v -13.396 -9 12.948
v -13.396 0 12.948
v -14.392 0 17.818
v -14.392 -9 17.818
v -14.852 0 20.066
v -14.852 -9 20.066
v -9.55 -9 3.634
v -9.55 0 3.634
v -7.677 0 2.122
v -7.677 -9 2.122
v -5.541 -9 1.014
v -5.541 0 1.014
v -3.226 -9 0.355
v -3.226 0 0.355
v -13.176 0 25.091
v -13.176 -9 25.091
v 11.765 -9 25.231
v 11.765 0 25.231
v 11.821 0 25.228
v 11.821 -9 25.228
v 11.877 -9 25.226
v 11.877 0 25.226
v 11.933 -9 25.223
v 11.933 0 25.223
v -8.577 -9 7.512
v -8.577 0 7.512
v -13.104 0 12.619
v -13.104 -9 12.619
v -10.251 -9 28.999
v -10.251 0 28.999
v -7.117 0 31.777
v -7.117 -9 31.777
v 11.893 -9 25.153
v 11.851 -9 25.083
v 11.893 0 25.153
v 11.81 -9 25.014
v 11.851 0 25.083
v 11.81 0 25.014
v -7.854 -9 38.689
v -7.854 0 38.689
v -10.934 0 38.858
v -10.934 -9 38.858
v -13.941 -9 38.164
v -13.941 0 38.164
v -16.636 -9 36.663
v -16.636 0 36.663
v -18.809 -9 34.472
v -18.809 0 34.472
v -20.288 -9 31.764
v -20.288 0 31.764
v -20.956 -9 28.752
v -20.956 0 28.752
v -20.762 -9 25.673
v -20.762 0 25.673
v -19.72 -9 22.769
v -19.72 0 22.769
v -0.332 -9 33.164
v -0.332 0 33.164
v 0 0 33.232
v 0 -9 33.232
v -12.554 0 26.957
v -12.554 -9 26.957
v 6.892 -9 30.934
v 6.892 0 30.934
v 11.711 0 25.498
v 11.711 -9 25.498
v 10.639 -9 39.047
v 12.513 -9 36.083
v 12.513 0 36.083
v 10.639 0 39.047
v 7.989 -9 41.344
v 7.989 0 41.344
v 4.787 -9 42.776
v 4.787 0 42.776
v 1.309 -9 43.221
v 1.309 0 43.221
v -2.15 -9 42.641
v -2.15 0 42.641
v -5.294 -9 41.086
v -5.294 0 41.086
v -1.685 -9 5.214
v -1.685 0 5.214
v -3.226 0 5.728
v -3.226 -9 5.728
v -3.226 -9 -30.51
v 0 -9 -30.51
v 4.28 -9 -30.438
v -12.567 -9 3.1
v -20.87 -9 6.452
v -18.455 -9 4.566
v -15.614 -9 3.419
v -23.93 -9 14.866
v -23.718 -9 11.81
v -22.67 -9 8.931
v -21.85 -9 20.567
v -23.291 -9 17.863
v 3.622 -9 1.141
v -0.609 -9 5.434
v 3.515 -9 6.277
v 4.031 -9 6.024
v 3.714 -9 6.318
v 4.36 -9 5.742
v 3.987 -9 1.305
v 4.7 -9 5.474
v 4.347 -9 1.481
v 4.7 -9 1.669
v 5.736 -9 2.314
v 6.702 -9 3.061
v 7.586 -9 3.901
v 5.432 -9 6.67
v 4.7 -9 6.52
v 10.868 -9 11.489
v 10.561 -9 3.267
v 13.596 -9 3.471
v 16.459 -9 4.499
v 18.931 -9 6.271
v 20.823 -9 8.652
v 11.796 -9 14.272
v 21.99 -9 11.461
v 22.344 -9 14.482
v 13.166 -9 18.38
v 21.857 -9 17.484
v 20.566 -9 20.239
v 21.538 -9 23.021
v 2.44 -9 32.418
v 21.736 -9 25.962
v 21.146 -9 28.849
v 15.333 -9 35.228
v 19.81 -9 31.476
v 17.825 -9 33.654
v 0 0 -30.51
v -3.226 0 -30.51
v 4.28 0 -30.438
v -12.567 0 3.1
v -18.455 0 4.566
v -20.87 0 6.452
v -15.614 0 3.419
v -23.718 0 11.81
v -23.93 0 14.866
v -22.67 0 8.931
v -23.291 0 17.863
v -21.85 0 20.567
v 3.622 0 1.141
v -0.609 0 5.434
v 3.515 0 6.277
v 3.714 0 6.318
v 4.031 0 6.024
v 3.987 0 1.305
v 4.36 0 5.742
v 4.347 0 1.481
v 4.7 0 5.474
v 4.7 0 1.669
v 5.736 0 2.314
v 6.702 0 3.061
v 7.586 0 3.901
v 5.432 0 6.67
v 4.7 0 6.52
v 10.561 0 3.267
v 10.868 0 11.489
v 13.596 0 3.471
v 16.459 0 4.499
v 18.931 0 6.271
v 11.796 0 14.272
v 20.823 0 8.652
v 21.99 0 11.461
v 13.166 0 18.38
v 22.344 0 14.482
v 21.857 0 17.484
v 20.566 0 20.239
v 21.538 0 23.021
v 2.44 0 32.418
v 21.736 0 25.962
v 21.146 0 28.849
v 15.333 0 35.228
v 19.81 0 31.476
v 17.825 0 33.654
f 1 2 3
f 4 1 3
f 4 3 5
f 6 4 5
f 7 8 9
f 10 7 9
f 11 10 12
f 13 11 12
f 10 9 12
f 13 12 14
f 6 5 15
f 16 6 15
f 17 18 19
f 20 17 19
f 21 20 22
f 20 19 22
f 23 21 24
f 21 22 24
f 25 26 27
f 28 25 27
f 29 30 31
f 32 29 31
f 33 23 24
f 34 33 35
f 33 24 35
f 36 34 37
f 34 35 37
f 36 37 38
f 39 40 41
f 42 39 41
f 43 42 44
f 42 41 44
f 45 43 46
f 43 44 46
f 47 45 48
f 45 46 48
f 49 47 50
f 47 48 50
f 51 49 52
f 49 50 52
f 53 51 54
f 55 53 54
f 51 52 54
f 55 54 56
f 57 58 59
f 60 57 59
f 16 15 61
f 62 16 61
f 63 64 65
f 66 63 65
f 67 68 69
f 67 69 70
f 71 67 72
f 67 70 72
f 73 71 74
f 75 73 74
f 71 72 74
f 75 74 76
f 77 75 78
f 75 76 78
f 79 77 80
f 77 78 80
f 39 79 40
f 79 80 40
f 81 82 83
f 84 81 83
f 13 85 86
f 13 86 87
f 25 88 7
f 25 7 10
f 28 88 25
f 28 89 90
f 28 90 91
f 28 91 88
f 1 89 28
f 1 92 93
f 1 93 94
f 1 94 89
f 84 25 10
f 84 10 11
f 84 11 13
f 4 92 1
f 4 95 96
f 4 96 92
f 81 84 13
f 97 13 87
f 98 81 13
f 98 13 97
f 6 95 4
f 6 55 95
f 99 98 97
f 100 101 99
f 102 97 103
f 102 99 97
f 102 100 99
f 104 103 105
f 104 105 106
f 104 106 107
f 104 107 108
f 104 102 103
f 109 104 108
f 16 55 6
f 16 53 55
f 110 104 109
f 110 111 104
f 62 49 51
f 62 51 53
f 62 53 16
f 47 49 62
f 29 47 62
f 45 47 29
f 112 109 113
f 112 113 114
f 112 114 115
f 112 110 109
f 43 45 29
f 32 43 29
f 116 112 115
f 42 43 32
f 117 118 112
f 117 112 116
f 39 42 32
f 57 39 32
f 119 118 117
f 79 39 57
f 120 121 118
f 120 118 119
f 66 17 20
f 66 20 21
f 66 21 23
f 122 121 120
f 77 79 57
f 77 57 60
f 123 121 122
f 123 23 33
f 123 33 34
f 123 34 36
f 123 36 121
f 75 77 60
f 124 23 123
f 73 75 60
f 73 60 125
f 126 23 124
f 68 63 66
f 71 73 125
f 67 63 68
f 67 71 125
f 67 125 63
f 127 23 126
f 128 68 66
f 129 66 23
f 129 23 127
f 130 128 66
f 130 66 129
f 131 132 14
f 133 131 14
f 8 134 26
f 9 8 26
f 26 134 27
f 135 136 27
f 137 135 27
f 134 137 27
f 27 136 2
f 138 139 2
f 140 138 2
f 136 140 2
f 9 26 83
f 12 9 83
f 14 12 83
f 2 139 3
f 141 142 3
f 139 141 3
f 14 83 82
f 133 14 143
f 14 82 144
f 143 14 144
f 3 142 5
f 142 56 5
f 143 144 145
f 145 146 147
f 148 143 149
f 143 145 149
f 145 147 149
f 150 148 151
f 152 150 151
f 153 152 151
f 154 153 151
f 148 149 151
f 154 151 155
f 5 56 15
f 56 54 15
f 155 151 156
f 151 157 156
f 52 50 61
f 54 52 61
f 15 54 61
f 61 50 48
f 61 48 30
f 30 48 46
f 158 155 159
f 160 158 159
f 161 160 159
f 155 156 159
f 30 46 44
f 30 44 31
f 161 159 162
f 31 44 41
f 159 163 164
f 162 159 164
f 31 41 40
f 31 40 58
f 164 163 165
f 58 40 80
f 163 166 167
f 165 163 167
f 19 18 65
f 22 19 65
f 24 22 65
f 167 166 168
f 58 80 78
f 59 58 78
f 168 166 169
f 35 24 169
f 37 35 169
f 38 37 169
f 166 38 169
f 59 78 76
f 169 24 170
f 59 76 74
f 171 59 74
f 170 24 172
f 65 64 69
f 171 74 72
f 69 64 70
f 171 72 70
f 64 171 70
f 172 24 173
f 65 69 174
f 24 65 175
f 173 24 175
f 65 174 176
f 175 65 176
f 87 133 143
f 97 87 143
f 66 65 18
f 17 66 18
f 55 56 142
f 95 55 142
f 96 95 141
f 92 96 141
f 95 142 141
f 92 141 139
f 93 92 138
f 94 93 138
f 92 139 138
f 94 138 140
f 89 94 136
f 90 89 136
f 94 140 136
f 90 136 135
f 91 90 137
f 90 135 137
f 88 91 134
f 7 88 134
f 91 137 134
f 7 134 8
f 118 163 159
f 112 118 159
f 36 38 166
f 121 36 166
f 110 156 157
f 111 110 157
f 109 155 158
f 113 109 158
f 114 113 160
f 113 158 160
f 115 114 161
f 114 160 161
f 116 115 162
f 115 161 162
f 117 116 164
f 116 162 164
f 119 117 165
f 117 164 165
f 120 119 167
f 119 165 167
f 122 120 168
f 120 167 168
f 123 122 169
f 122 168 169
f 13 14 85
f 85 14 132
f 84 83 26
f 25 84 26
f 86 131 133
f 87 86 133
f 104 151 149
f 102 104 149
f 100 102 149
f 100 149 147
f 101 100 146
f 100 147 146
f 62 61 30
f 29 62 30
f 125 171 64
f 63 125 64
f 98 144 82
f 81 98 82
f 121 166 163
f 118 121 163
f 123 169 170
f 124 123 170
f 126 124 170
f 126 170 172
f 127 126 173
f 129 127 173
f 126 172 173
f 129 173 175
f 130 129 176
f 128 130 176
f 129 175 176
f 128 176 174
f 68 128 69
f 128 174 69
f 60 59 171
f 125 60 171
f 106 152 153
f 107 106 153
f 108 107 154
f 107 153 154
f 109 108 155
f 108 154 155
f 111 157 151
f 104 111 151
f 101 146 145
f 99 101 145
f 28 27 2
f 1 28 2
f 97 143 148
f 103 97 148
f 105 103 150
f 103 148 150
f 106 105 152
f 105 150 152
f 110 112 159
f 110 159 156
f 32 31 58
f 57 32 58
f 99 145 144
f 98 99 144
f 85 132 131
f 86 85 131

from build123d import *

# Parameters (mm, degrees)
F1_DEPTH = 9


with BuildPart() as f1:
    # F0 (on Front) → F1 (new body)
    with BuildSketch(Plane.XZ):
        with BuildLine():
            ThreePointArc((-19.7199515168, 22.7688088414), (-16.6360107994, 24.4598997459), (-13.1759548296, 25.0911615632))
            Line((-13.1759548296, 25.0911615632), (-12.553585429, 26.9574491451))
            Line((-12.553585429, 26.9574491451), (-10.2510419619, 28.9986901835))
            ThreePointArc((-10.2510419619, 28.9986901835), (-10.1077855778, 34.1050974839), (-7.8535185141, 38.6892220367))
            ThreePointArc((-7.8535185141, 38.6892220367), (-18.8089000647, 34.4723344318), (-19.7199515168, 22.7688088414))
        make_face()
        with BuildLine():
            Line((-14.8518085926, 20.0658099574), (-13.1759548296, 25.0911615632))
            ThreePointArc((-13.1759548296, 25.0911615632), (-16.6360107994, 24.4598997459), (-19.7199515168, 22.7688088414))
            ThreePointArc((-19.7199515168, 22.7688088414), (-17.4770465825, 19.8404198684), (-14.3921665295, 17.8181440266))
            Line((-14.3921665295, 17.8181440266), (-14.8518085926, 20.0658099574))
        make_face()
        with BuildLine():
            Line((-13.3963086419, 12.9483637654), (-14.3921665295, 17.8181440266))
            ThreePointArc((-14.3921665295, 17.8181440266), (-17.4770465825, 19.8404198684), (-19.7199515168, 22.7688088414))
            ThreePointArc((-19.7199515168, 22.7688088414), (-22.6703383342, 8.9306933135), (-9.5498657155, 3.6343339981))
            ThreePointArc((-9.5498657155, 3.6343339981), (-12.2712093358, 7.7530477474), (-13.1041599616, 12.6188166798))
            Line((-13.1041599616, 12.6188166798), (-13.3963086419, 12.9483637654))
        make_face()
        with BuildLine():
            Line((-3.2264382129, 0.3550507135), (-3.2264382129, 5.7278911556))
            Line((-3.2264382129, 5.7278911556), (-5.1312660195, 6.3631129466))
            ThreePointArc((-5.1312660195, 6.3631129466), (-7.1772197402, 4.7342237961), (-9.5498657155, 3.6343339981))
            ThreePointArc((-9.5498657155, 3.6343339981), (-6.6370818502, 1.5146819538), (-3.2264382129, 0.3550507135))
        make_face()
        with BuildLine():
            Line((-1.6854464257, 5.2140013649), (-3.2264382129, 5.7278911556))
            Line((-3.2264382129, 5.7278911556), (-3.2264382129, 0.3550507135))
            ThreePointArc((-3.2264382129, 0.3550507135), (0.2553267791, 0.2456421269), (3.6218142124, 1.140862803))
            Line((3.6218142124, 1.140862803), (3.5146783317, 6.277413876))
            Line((3.5146783317, 6.277413876), (-0.6090724081, 5.4341171602))
            Line((-0.6090724081, 5.4341171602), (-1.6854464257, 5.2140013649))
        make_face()
        with BuildLine():
            ThreePointArc((-9.5498657155, 3.6343339981), (-7.1772197402, 4.7342237961), (-5.1312660195, 6.3631129466))
            Line((-5.1312660195, 6.3631129466), (-8.5770856134, 7.5122245284))
            Line((-8.5770856134, 7.5122245284), (-13.1041599616, 12.6188166798))
            ThreePointArc((-13.1041599616, 12.6188166798), (-12.2712093358, 7.7530477474), (-9.5498657155, 3.6343339981))
        make_face()
        with BuildLine():
            ThreePointArc((3.6218142124, 1.140862803), (0.2553267791, 0.2456421269), (-3.2264382129, 0.3550507135))
            Line((-3.2264382129, 0.3550507135), (-3.2264382129, -30.5104665458))
            Line((-3.2264382129, -30.5104665458), (0, -30.5104665458))
            Line((0, -30.5104665458), (4.2804706275, -30.4379349907))
            Line((4.2804706275, -30.4379349907), (3.6218142124, 1.140862803))
        make_face()
        with BuildLine():
            ThreePointArc((-7.8535185141, 38.6892220367), (-10.1077855778, 34.1050974839), (-10.2510419619, 28.9986901835))
            Line((-10.2510419619, 28.9986901835), (-7.117446192, 31.7766721736))
            Line((-7.117446192, 31.7766721736), (-0.3315885654, 33.1643630917))
            ThreePointArc((-0.3315885654, 33.1643630917), (-3.477568869, 36.7640757707), (-7.8535185141, 38.6892220367))
        make_face()
        with BuildLine():
            ThreePointArc((12.5130116372, 36.0825908768), (3.0643977065, 43.1259953977), (-7.8535185141, 38.6892220367))
            ThreePointArc((-7.8535185141, 38.6892220367), (-3.477568869, 36.7640757707), (-0.3315885654, 33.1643630917))
            Line((-0.3315885654, 33.1643630917), (0, 33.2321721243))
            Line((0, 33.2321721243), (2.4402343405, 32.4184030146))
            ThreePointArc((2.4402343405, 32.4184030146), (7.0001300905, 35.5603661525), (12.5130116372, 36.0825908768))
        make_face()
        with BuildLine():
            Line((3.5146783317, 6.277413876), (3.6218142124, 1.140862803))
            ThreePointArc((3.6218142124, 1.140862803), (4.1675414436, 1.3915355093), (4.70004417, 1.6691969268))
            Line((4.70004417, 1.6691969268), (4.70004417, 5.4740770661))
            ThreePointArc((4.70004417, 5.4740770661), (4.1944674507, 5.8815460805), (3.7138142861, 6.3181366808))
            Line((3.7138142861, 6.3181366808), (3.5146783317, 6.277413876))
        make_face()
        with BuildLine():
            ThreePointArc((20.5664608958, 20.2387270332), (20.5664608958, 30.2074464559), (12.5130116372, 36.0825908768))
            ThreePointArc((12.5130116372, 36.0825908768), (13.5239296541, 30.5833992601), (11.9332966326, 25.2230867446))
            ThreePointArc((11.9332966326, 25.2230867446), (16.8469164385, 23.7650064749), (20.5664608958, 20.2387270332))
        make_face()
        with BuildLine():
            ThreePointArc((11.9332966326, 25.2230867446), (13.5239296541, 30.5833992601), (12.5130116372, 36.0825908768))
            ThreePointArc((12.5130116372, 36.0825908768), (7.0001300905, 35.5603661525), (2.4402343405, 32.4184030146))
            Line((2.4402343405, 32.4184030146), (6.8916391877, 30.9339489607))
            Line((6.8916391877, 30.9339489607), (11.7108622162, 25.4978097237))
            Line((11.7108622162, 25.4978097237), (11.7654730156, 25.2307609848))
            ThreePointArc((11.7654730156, 25.2307609848), (11.849399475, 25.2272442579), (11.9332966326, 25.2230867446))
        make_face()
        with BuildLine():
            Line((4.70004417, 5.4740770661), (4.70004417, 1.6691969268))
            ThreePointArc((4.70004417, 1.6691969268), (6.2285853657, 2.6749839802), (7.5864404314, 3.9014730362))
            ThreePointArc((7.5864404314, 3.9014730362), (6.0841704451, 4.579353109), (4.70004417, 5.4740770661))
        make_face()
        with BuildLine():
            Line((5.4319997663, 6.6695013155), (4.70004417, 6.5198182262))
            Line((4.70004417, 6.5198182262), (4.70004417, 5.4740770661))
            ThreePointArc((4.70004417, 5.4740770661), (6.0841704451, 4.579353109), (7.5864404314, 3.9014730362))
            ThreePointArc((7.5864404314, 3.9014730362), (9.9012477971, 7.4035929552), (10.8681390033, 11.488724344))
            Line((10.8681390033, 11.488724344), (5.4319997663, 6.6695013155))
        make_face()
        with BuildLine():
            ThreePointArc((20.5664608958, 20.2387270332), (16.8469164385, 23.7650064749), (11.9332966326, 25.2230867446))
            ThreePointArc((11.9332966326, 25.2230867446), (11.8720696964, 25.1182665807), (11.8097855463, 25.0140711437))
            Line((11.8097855463, 25.0140711437), (13.1663621669, 18.3803635317))
            Line((13.1663621669, 18.3803635317), (11.7962916439, 14.2719584578))
            ThreePointArc((11.7962916439, 14.2719584578), (16.9481115684, 16.1283678588), (20.5664608958, 20.2387270332))
        make_face()
        with BuildLine():
            ThreePointArc((7.5864404314, 3.9014730362), (19.9595132668, 7.3959808102), (20.5664608958, 20.2387270332))
            ThreePointArc((20.5664608958, 20.2387270332), (16.9481115684, 16.1283678588), (11.7962916439, 14.2719584578))
            Line((11.7962916439, 14.2719584578), (10.8681390033, 11.488724344))
            ThreePointArc((10.8681390033, 11.488724344), (9.9012477971, 7.4035929552), (7.5864404314, 3.9014730362))
        make_face()
    extrude(amount=F1_DEPTH)


solid = f1.part
